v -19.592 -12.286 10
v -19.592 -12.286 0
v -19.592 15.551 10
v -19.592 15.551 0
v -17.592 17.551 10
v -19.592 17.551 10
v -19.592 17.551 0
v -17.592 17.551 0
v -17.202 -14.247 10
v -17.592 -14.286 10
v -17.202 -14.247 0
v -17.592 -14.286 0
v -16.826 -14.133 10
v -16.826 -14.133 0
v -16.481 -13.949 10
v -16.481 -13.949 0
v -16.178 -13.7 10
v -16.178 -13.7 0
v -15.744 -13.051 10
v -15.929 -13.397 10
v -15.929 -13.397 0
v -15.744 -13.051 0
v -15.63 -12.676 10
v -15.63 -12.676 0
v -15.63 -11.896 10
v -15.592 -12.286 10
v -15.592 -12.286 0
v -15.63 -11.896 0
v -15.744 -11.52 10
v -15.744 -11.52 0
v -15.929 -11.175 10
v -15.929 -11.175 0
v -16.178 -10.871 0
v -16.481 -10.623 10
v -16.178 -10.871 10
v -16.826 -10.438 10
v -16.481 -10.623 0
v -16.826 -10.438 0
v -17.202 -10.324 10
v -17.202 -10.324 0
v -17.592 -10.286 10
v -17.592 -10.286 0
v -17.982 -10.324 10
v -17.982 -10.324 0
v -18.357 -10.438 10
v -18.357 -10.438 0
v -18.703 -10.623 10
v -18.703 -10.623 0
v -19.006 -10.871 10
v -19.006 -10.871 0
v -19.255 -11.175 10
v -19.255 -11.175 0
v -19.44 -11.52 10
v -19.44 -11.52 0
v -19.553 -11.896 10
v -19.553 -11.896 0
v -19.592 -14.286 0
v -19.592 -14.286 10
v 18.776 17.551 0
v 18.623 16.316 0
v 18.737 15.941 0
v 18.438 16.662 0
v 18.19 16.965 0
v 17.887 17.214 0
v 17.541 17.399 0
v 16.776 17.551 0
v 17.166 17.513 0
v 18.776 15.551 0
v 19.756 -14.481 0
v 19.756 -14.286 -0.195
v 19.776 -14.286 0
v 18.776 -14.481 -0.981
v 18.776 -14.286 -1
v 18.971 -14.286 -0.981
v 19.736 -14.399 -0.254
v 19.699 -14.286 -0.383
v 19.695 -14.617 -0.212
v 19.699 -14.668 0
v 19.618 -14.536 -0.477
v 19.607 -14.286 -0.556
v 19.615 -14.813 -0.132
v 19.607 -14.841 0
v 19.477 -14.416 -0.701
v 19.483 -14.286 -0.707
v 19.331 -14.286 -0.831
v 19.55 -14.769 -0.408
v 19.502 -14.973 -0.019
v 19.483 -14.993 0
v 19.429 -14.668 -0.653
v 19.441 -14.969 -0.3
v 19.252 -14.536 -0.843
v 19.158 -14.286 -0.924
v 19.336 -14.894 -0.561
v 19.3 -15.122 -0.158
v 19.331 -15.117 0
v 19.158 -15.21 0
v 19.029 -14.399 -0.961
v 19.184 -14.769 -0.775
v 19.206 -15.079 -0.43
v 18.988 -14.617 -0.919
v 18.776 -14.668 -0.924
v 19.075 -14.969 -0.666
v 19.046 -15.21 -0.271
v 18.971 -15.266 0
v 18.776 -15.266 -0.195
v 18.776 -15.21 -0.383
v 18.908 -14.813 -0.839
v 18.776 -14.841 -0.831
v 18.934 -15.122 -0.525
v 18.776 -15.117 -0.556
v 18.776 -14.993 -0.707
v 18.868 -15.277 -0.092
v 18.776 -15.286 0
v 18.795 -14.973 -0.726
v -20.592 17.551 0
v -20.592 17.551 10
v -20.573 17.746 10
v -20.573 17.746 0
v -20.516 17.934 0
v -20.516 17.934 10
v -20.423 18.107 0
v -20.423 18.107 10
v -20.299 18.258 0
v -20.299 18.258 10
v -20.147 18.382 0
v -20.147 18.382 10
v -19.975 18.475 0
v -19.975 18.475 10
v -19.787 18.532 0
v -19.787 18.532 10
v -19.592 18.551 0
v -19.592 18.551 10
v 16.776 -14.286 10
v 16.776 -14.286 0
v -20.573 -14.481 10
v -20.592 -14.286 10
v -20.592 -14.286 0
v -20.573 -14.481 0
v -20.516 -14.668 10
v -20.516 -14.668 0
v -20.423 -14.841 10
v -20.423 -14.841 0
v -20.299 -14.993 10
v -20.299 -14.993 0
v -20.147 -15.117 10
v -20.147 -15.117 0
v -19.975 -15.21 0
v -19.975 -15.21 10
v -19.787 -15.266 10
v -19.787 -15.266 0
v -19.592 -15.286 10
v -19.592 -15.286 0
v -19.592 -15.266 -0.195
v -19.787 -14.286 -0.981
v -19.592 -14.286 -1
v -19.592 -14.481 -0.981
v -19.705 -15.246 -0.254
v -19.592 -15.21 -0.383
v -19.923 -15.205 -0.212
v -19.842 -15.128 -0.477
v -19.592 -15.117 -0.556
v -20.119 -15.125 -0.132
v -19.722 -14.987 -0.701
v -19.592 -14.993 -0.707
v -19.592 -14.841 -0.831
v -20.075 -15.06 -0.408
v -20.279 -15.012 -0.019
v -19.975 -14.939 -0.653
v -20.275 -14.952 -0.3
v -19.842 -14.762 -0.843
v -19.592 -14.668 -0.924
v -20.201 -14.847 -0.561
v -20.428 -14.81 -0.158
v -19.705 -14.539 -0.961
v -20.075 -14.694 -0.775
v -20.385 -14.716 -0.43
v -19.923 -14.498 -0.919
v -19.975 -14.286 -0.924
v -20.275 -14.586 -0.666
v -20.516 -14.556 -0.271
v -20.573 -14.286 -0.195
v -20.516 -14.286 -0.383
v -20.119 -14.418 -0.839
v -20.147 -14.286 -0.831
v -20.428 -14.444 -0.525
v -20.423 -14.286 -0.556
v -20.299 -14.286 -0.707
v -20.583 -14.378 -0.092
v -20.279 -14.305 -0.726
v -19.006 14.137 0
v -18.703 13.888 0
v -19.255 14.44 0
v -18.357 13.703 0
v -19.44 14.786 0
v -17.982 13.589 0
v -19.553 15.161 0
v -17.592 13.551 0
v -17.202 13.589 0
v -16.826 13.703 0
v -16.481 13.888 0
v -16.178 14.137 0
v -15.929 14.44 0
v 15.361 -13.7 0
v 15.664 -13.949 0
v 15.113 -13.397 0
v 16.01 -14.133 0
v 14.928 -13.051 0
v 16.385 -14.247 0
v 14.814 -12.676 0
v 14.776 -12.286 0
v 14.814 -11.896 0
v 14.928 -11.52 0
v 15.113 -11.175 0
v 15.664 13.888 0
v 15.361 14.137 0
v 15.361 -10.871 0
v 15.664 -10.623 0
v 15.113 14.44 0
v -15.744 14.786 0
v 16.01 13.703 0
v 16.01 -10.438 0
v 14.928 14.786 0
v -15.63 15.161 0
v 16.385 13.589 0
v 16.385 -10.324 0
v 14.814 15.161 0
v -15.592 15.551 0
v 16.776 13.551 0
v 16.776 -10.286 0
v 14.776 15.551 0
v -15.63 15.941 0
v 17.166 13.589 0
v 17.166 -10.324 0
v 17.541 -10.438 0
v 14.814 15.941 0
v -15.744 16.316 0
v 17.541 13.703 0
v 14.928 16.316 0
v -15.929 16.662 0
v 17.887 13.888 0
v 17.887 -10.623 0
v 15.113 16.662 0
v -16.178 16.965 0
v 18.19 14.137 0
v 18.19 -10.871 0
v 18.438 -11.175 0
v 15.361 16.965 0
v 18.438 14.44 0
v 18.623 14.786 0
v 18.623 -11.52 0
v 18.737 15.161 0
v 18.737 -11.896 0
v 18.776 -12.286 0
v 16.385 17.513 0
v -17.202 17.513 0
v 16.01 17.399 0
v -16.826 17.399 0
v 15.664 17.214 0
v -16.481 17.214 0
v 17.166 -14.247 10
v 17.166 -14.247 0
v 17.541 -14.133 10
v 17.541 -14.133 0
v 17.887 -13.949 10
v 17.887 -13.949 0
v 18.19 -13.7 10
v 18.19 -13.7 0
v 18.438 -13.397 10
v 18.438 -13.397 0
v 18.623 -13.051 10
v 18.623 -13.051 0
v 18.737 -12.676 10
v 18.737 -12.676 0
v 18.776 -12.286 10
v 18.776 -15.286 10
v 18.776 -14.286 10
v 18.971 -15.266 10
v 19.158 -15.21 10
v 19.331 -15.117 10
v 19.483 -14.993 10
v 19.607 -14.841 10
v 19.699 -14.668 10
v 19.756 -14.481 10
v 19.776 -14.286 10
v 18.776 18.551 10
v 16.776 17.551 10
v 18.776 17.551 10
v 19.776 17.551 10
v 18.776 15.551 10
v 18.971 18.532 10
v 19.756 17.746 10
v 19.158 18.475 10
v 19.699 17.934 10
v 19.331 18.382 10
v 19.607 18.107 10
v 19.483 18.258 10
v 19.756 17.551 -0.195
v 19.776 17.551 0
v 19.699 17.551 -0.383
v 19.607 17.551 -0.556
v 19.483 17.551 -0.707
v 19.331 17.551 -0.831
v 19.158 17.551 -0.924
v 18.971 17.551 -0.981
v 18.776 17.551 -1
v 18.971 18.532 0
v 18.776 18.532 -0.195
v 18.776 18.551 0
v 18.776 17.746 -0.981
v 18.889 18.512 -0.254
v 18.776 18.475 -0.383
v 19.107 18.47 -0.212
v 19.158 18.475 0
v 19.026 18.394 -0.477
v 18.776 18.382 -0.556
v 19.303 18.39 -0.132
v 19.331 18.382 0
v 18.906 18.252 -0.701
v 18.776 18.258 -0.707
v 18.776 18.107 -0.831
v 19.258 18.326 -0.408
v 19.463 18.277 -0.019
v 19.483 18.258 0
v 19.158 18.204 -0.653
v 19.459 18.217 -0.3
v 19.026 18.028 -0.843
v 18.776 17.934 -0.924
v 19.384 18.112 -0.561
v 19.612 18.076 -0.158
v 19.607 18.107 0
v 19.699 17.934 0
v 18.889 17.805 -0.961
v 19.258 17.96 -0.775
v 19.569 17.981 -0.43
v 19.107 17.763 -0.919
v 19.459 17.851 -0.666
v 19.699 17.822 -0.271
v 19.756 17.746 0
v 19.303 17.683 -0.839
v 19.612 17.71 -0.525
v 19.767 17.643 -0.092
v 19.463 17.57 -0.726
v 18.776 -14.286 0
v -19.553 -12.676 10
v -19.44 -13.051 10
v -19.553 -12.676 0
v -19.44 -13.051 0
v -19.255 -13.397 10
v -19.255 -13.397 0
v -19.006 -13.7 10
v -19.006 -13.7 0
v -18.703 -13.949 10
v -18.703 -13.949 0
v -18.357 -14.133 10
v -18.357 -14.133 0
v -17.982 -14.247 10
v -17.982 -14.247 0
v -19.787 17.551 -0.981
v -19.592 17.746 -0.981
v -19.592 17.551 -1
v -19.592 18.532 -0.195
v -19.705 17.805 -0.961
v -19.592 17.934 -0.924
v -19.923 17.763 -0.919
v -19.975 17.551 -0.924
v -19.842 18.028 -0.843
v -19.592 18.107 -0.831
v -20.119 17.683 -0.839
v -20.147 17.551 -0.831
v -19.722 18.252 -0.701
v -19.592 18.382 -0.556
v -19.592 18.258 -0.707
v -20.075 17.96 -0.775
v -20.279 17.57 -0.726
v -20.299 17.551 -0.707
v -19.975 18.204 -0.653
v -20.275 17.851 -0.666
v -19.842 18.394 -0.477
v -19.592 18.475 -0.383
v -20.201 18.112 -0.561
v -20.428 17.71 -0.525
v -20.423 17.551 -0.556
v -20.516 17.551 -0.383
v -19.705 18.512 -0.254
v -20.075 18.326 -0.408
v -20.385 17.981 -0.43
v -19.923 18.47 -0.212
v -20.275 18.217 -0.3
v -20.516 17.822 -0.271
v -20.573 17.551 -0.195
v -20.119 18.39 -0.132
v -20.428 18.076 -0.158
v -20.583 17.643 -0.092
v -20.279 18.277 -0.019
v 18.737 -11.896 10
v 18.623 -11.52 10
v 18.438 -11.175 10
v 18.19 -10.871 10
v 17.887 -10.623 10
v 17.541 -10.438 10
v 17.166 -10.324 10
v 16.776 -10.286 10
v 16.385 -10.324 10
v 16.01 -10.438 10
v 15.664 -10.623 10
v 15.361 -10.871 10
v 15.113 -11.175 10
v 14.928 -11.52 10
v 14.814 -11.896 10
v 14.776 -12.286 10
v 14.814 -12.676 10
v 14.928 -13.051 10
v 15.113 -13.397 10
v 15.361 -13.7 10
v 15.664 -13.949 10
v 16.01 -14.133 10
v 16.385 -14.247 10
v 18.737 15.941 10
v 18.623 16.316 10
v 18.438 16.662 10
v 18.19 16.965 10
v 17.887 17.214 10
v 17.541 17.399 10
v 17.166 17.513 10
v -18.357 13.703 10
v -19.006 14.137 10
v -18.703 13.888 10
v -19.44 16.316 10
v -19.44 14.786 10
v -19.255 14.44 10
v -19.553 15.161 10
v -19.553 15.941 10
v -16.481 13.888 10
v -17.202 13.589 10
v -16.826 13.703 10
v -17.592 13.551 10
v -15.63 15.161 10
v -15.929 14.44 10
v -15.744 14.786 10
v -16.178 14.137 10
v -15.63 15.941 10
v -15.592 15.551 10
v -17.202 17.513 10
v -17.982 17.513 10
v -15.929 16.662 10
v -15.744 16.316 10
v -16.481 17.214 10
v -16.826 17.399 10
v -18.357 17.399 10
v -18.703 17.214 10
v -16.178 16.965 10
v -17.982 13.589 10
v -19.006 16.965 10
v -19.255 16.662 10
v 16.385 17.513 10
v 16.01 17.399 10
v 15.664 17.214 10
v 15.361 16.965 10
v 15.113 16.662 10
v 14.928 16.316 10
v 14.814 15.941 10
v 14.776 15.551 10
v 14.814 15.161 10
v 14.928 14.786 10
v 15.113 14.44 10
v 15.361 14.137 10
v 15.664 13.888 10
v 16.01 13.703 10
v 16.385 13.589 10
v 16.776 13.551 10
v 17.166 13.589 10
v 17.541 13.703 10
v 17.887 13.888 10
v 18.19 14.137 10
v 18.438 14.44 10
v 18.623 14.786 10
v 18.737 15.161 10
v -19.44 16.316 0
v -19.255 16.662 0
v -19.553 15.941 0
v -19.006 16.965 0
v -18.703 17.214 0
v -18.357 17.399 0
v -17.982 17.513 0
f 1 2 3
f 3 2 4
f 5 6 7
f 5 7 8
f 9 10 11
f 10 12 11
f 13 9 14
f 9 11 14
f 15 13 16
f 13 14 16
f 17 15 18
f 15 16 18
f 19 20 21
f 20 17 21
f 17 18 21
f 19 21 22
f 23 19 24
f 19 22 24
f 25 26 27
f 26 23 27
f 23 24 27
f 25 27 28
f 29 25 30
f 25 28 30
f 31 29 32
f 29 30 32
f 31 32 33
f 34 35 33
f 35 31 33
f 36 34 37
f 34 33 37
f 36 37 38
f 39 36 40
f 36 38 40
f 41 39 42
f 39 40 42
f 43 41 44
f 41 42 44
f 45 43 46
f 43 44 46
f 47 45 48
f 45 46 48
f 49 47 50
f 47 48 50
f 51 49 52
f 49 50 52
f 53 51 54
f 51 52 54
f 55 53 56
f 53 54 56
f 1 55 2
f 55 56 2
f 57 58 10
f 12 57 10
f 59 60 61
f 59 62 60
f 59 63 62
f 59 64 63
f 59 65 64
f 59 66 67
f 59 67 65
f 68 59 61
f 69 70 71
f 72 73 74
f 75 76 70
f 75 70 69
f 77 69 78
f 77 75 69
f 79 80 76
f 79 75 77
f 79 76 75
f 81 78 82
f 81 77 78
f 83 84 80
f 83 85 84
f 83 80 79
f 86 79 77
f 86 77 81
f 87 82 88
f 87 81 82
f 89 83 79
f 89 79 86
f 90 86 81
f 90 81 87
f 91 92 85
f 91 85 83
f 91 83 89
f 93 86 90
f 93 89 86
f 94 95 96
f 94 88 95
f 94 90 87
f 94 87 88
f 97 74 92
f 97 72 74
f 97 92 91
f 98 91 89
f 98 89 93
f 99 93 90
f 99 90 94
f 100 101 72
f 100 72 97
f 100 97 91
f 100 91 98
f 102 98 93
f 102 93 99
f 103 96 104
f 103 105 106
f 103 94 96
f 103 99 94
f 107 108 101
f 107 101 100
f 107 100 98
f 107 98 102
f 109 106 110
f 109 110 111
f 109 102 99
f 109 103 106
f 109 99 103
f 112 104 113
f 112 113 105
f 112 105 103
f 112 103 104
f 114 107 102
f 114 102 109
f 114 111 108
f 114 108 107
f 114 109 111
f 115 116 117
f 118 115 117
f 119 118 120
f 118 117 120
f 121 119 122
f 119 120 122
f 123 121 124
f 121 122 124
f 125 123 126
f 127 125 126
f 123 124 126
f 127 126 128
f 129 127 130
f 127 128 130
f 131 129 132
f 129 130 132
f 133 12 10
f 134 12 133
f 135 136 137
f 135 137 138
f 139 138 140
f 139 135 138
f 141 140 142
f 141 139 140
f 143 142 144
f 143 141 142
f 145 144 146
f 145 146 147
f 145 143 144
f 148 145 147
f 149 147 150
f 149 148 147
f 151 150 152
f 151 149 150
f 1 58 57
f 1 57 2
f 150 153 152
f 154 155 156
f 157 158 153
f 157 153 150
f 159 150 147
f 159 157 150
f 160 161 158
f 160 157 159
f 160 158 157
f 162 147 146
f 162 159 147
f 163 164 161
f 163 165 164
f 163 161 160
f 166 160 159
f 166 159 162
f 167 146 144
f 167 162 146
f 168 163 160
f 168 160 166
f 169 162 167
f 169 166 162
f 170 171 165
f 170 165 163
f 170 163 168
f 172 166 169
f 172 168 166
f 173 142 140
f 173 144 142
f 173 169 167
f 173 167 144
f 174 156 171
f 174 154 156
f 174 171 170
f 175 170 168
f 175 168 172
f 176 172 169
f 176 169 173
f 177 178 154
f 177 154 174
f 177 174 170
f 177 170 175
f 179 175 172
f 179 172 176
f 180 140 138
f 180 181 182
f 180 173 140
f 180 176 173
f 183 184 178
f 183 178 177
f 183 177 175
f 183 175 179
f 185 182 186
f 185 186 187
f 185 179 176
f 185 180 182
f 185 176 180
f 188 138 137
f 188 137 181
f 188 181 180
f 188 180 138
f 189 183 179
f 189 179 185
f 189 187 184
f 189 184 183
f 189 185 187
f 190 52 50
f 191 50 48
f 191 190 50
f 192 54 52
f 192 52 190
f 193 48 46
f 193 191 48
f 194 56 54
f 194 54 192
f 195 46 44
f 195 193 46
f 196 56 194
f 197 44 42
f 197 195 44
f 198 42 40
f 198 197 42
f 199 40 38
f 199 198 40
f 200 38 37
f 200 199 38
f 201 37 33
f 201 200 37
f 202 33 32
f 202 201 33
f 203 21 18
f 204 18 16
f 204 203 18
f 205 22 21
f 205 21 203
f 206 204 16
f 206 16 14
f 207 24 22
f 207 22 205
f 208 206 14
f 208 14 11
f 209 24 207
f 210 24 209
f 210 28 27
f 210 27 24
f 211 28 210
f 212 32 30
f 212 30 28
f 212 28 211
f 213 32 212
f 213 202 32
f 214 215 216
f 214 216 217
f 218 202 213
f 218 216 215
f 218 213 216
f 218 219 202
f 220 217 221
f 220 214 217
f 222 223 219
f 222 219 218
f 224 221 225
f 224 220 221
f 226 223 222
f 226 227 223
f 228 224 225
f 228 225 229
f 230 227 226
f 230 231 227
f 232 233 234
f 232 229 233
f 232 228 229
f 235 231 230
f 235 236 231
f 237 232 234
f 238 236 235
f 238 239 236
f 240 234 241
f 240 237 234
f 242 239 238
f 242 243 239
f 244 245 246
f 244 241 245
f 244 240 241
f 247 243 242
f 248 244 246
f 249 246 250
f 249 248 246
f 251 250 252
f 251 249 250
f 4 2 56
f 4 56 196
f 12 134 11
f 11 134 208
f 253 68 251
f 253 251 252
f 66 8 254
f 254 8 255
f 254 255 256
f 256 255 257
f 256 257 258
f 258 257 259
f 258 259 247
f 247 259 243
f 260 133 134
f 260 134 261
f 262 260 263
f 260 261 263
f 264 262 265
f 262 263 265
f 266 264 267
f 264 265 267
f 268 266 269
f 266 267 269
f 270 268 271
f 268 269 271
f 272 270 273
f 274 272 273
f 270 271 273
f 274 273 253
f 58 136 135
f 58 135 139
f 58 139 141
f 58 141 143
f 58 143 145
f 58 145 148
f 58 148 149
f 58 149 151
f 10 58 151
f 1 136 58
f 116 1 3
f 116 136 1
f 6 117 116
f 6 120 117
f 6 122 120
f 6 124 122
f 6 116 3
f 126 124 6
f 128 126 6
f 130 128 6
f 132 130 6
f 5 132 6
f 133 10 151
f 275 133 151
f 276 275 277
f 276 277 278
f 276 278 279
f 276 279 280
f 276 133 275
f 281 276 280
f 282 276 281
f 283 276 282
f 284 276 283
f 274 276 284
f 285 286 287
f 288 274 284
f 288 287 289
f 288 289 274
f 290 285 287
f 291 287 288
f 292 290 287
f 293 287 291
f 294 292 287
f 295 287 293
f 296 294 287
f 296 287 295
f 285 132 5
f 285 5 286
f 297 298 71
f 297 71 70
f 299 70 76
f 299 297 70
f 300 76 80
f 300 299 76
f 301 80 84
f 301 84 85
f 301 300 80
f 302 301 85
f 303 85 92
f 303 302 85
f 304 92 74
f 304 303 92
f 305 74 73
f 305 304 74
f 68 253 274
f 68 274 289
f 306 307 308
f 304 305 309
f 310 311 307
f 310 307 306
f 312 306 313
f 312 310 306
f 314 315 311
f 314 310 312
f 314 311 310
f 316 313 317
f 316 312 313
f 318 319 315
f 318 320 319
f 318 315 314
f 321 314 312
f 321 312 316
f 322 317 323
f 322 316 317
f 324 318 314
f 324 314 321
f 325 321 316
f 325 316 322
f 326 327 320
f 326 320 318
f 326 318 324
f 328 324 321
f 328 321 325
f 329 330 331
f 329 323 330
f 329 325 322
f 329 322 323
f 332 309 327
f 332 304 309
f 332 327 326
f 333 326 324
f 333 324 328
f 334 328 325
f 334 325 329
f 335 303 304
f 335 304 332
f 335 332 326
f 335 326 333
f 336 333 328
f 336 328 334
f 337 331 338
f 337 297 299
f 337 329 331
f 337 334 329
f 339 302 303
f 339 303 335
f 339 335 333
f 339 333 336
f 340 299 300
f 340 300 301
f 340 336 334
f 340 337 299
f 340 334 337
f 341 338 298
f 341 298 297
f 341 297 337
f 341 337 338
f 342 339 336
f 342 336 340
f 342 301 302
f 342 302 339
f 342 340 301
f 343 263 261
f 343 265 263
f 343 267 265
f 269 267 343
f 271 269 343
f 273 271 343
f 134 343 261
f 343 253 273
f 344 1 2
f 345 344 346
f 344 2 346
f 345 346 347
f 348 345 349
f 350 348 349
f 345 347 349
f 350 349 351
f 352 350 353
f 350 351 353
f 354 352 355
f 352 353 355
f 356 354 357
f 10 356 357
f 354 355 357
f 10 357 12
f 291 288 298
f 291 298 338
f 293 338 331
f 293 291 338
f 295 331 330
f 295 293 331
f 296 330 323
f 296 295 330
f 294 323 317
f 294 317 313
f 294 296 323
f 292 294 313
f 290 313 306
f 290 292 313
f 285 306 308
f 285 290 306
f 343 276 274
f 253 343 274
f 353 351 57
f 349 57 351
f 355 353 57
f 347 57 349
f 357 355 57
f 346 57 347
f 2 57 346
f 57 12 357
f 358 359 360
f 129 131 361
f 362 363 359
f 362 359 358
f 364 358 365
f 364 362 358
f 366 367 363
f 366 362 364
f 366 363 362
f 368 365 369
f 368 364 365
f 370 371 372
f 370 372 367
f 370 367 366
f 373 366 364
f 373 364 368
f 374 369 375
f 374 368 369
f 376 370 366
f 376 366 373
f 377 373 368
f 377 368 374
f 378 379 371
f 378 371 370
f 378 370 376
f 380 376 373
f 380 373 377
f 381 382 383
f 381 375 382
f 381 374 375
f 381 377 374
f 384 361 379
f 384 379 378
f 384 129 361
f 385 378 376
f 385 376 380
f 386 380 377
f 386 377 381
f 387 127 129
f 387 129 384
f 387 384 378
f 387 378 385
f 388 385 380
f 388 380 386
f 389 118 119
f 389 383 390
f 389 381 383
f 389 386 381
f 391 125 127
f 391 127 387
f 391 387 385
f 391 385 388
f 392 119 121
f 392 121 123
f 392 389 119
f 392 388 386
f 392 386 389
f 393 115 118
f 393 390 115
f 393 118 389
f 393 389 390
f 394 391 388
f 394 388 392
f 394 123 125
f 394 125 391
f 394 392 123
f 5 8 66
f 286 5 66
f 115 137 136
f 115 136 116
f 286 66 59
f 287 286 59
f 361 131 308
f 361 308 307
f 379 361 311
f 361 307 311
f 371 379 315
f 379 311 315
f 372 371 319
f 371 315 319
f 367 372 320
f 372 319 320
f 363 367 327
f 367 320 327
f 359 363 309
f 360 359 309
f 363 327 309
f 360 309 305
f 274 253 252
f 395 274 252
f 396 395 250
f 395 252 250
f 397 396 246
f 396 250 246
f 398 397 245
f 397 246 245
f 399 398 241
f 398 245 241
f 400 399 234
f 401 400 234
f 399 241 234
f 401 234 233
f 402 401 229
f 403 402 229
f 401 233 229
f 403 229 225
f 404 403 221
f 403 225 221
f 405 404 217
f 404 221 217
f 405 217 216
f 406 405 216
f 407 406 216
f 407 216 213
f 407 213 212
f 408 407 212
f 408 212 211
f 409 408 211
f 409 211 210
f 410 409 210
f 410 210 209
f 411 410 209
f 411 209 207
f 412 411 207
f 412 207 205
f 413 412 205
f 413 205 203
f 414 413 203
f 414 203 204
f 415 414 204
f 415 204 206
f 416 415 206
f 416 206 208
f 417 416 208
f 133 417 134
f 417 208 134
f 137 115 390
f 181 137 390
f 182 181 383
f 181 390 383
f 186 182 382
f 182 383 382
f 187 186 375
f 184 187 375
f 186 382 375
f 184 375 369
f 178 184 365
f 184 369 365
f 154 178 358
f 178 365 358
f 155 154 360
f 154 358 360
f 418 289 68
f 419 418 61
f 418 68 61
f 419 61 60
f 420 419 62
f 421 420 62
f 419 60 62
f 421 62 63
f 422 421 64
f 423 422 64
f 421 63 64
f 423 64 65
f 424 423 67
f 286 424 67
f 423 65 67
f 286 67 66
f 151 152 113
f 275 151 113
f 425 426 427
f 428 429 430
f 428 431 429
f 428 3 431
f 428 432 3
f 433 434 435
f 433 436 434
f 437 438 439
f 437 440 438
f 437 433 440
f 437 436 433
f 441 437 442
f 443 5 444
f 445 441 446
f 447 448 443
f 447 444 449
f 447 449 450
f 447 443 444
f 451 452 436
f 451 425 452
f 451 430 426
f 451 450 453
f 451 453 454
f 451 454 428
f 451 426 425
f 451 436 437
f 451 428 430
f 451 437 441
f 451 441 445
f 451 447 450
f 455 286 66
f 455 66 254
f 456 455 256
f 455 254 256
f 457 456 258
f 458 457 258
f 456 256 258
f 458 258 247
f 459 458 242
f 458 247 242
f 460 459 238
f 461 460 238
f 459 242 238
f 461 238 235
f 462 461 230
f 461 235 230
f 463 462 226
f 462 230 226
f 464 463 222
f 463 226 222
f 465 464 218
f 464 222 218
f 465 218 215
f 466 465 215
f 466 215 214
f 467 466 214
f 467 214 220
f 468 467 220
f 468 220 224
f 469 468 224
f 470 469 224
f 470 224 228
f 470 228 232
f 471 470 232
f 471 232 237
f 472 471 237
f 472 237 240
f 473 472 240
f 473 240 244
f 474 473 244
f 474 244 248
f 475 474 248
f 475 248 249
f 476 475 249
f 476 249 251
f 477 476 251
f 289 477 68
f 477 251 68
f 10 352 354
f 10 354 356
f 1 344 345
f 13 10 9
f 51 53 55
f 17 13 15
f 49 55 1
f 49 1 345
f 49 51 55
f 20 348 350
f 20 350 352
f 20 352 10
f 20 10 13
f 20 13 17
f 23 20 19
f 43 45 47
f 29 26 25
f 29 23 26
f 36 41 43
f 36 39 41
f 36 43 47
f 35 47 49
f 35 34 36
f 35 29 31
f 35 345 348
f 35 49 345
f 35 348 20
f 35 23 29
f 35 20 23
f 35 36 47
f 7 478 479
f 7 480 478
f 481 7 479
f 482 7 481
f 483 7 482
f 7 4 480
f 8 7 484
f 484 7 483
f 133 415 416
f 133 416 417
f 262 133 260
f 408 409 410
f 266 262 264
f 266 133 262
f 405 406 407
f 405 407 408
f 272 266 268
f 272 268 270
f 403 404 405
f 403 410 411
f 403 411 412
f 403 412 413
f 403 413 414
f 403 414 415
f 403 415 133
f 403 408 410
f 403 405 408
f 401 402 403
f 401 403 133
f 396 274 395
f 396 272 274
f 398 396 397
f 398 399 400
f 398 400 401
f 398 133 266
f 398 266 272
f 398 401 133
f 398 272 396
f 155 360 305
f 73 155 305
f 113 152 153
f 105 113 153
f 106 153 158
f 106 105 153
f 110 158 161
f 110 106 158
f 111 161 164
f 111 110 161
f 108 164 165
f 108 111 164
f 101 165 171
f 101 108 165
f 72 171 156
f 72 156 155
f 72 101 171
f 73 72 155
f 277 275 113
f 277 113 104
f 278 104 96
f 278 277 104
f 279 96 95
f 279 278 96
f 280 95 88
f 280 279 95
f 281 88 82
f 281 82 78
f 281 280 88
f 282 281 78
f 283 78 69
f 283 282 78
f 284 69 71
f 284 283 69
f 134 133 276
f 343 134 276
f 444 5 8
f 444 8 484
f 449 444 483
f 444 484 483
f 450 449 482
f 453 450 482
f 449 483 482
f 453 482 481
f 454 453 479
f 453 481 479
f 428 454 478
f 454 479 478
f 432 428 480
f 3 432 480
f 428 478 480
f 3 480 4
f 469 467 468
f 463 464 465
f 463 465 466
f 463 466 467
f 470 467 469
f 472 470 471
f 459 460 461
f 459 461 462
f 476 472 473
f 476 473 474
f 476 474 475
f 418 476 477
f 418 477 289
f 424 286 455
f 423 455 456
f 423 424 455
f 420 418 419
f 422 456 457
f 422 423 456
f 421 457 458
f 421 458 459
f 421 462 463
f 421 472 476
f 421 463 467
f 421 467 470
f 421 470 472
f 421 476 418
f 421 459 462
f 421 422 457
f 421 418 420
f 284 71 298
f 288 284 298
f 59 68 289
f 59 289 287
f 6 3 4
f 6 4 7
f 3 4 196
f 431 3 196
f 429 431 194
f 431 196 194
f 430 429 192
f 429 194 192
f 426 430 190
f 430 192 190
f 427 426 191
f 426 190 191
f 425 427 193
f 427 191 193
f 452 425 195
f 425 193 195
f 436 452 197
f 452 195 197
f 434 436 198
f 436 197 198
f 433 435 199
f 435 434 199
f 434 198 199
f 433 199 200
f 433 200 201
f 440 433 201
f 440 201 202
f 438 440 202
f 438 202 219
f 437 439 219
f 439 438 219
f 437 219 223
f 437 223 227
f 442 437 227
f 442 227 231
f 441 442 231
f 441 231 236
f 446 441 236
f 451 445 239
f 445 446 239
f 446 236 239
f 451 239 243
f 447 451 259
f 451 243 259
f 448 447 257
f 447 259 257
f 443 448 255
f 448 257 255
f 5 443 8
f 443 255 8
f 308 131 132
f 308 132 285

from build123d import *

# Parameters (mm, degrees)
SKETCH_W     = 38.36735
SKETCH_H     = 31.836736
PAD_DEPTH    = 10
THICKNESS_T  = 1
SKETCH001_R  = 2
PAD001_DEPTH = 10


with BuildPart() as part:
    # Sketch → Pad (new body)
    with BuildSketch(Plane.XY):
        with Locations((-0.408164, 1.632655)):
            Rectangle(SKETCH_W, SKETCH_H)
    extrude(amount=PAD_DEPTH)

    # Thickness
    thickness_openings = [part.faces().sort_by_distance(p)[0] for p in [
        (-0.408164, 1.632655, 10),
    ]]
    offset(amount=THICKNESS_T, openings=thickness_openings)

    # Sketch001 (on Face5 of Thickness) → Pad001 (join)
    with BuildSketch(Plane.XY):
        with Locations((-17.591839, 15.551023)):
            Circle(SKETCH001_R)
        with Locations((16.775511, 15.551023)):
            Circle(SKETCH001_R)
        with Locations((16.775511, -12.285713)):
            Circle(SKETCH001_R)
        with Locations((-17.591839, -12.285713)):
            Circle(SKETCH001_R)
    extrude(amount=PAD001_DEPTH)


solid = part.part
